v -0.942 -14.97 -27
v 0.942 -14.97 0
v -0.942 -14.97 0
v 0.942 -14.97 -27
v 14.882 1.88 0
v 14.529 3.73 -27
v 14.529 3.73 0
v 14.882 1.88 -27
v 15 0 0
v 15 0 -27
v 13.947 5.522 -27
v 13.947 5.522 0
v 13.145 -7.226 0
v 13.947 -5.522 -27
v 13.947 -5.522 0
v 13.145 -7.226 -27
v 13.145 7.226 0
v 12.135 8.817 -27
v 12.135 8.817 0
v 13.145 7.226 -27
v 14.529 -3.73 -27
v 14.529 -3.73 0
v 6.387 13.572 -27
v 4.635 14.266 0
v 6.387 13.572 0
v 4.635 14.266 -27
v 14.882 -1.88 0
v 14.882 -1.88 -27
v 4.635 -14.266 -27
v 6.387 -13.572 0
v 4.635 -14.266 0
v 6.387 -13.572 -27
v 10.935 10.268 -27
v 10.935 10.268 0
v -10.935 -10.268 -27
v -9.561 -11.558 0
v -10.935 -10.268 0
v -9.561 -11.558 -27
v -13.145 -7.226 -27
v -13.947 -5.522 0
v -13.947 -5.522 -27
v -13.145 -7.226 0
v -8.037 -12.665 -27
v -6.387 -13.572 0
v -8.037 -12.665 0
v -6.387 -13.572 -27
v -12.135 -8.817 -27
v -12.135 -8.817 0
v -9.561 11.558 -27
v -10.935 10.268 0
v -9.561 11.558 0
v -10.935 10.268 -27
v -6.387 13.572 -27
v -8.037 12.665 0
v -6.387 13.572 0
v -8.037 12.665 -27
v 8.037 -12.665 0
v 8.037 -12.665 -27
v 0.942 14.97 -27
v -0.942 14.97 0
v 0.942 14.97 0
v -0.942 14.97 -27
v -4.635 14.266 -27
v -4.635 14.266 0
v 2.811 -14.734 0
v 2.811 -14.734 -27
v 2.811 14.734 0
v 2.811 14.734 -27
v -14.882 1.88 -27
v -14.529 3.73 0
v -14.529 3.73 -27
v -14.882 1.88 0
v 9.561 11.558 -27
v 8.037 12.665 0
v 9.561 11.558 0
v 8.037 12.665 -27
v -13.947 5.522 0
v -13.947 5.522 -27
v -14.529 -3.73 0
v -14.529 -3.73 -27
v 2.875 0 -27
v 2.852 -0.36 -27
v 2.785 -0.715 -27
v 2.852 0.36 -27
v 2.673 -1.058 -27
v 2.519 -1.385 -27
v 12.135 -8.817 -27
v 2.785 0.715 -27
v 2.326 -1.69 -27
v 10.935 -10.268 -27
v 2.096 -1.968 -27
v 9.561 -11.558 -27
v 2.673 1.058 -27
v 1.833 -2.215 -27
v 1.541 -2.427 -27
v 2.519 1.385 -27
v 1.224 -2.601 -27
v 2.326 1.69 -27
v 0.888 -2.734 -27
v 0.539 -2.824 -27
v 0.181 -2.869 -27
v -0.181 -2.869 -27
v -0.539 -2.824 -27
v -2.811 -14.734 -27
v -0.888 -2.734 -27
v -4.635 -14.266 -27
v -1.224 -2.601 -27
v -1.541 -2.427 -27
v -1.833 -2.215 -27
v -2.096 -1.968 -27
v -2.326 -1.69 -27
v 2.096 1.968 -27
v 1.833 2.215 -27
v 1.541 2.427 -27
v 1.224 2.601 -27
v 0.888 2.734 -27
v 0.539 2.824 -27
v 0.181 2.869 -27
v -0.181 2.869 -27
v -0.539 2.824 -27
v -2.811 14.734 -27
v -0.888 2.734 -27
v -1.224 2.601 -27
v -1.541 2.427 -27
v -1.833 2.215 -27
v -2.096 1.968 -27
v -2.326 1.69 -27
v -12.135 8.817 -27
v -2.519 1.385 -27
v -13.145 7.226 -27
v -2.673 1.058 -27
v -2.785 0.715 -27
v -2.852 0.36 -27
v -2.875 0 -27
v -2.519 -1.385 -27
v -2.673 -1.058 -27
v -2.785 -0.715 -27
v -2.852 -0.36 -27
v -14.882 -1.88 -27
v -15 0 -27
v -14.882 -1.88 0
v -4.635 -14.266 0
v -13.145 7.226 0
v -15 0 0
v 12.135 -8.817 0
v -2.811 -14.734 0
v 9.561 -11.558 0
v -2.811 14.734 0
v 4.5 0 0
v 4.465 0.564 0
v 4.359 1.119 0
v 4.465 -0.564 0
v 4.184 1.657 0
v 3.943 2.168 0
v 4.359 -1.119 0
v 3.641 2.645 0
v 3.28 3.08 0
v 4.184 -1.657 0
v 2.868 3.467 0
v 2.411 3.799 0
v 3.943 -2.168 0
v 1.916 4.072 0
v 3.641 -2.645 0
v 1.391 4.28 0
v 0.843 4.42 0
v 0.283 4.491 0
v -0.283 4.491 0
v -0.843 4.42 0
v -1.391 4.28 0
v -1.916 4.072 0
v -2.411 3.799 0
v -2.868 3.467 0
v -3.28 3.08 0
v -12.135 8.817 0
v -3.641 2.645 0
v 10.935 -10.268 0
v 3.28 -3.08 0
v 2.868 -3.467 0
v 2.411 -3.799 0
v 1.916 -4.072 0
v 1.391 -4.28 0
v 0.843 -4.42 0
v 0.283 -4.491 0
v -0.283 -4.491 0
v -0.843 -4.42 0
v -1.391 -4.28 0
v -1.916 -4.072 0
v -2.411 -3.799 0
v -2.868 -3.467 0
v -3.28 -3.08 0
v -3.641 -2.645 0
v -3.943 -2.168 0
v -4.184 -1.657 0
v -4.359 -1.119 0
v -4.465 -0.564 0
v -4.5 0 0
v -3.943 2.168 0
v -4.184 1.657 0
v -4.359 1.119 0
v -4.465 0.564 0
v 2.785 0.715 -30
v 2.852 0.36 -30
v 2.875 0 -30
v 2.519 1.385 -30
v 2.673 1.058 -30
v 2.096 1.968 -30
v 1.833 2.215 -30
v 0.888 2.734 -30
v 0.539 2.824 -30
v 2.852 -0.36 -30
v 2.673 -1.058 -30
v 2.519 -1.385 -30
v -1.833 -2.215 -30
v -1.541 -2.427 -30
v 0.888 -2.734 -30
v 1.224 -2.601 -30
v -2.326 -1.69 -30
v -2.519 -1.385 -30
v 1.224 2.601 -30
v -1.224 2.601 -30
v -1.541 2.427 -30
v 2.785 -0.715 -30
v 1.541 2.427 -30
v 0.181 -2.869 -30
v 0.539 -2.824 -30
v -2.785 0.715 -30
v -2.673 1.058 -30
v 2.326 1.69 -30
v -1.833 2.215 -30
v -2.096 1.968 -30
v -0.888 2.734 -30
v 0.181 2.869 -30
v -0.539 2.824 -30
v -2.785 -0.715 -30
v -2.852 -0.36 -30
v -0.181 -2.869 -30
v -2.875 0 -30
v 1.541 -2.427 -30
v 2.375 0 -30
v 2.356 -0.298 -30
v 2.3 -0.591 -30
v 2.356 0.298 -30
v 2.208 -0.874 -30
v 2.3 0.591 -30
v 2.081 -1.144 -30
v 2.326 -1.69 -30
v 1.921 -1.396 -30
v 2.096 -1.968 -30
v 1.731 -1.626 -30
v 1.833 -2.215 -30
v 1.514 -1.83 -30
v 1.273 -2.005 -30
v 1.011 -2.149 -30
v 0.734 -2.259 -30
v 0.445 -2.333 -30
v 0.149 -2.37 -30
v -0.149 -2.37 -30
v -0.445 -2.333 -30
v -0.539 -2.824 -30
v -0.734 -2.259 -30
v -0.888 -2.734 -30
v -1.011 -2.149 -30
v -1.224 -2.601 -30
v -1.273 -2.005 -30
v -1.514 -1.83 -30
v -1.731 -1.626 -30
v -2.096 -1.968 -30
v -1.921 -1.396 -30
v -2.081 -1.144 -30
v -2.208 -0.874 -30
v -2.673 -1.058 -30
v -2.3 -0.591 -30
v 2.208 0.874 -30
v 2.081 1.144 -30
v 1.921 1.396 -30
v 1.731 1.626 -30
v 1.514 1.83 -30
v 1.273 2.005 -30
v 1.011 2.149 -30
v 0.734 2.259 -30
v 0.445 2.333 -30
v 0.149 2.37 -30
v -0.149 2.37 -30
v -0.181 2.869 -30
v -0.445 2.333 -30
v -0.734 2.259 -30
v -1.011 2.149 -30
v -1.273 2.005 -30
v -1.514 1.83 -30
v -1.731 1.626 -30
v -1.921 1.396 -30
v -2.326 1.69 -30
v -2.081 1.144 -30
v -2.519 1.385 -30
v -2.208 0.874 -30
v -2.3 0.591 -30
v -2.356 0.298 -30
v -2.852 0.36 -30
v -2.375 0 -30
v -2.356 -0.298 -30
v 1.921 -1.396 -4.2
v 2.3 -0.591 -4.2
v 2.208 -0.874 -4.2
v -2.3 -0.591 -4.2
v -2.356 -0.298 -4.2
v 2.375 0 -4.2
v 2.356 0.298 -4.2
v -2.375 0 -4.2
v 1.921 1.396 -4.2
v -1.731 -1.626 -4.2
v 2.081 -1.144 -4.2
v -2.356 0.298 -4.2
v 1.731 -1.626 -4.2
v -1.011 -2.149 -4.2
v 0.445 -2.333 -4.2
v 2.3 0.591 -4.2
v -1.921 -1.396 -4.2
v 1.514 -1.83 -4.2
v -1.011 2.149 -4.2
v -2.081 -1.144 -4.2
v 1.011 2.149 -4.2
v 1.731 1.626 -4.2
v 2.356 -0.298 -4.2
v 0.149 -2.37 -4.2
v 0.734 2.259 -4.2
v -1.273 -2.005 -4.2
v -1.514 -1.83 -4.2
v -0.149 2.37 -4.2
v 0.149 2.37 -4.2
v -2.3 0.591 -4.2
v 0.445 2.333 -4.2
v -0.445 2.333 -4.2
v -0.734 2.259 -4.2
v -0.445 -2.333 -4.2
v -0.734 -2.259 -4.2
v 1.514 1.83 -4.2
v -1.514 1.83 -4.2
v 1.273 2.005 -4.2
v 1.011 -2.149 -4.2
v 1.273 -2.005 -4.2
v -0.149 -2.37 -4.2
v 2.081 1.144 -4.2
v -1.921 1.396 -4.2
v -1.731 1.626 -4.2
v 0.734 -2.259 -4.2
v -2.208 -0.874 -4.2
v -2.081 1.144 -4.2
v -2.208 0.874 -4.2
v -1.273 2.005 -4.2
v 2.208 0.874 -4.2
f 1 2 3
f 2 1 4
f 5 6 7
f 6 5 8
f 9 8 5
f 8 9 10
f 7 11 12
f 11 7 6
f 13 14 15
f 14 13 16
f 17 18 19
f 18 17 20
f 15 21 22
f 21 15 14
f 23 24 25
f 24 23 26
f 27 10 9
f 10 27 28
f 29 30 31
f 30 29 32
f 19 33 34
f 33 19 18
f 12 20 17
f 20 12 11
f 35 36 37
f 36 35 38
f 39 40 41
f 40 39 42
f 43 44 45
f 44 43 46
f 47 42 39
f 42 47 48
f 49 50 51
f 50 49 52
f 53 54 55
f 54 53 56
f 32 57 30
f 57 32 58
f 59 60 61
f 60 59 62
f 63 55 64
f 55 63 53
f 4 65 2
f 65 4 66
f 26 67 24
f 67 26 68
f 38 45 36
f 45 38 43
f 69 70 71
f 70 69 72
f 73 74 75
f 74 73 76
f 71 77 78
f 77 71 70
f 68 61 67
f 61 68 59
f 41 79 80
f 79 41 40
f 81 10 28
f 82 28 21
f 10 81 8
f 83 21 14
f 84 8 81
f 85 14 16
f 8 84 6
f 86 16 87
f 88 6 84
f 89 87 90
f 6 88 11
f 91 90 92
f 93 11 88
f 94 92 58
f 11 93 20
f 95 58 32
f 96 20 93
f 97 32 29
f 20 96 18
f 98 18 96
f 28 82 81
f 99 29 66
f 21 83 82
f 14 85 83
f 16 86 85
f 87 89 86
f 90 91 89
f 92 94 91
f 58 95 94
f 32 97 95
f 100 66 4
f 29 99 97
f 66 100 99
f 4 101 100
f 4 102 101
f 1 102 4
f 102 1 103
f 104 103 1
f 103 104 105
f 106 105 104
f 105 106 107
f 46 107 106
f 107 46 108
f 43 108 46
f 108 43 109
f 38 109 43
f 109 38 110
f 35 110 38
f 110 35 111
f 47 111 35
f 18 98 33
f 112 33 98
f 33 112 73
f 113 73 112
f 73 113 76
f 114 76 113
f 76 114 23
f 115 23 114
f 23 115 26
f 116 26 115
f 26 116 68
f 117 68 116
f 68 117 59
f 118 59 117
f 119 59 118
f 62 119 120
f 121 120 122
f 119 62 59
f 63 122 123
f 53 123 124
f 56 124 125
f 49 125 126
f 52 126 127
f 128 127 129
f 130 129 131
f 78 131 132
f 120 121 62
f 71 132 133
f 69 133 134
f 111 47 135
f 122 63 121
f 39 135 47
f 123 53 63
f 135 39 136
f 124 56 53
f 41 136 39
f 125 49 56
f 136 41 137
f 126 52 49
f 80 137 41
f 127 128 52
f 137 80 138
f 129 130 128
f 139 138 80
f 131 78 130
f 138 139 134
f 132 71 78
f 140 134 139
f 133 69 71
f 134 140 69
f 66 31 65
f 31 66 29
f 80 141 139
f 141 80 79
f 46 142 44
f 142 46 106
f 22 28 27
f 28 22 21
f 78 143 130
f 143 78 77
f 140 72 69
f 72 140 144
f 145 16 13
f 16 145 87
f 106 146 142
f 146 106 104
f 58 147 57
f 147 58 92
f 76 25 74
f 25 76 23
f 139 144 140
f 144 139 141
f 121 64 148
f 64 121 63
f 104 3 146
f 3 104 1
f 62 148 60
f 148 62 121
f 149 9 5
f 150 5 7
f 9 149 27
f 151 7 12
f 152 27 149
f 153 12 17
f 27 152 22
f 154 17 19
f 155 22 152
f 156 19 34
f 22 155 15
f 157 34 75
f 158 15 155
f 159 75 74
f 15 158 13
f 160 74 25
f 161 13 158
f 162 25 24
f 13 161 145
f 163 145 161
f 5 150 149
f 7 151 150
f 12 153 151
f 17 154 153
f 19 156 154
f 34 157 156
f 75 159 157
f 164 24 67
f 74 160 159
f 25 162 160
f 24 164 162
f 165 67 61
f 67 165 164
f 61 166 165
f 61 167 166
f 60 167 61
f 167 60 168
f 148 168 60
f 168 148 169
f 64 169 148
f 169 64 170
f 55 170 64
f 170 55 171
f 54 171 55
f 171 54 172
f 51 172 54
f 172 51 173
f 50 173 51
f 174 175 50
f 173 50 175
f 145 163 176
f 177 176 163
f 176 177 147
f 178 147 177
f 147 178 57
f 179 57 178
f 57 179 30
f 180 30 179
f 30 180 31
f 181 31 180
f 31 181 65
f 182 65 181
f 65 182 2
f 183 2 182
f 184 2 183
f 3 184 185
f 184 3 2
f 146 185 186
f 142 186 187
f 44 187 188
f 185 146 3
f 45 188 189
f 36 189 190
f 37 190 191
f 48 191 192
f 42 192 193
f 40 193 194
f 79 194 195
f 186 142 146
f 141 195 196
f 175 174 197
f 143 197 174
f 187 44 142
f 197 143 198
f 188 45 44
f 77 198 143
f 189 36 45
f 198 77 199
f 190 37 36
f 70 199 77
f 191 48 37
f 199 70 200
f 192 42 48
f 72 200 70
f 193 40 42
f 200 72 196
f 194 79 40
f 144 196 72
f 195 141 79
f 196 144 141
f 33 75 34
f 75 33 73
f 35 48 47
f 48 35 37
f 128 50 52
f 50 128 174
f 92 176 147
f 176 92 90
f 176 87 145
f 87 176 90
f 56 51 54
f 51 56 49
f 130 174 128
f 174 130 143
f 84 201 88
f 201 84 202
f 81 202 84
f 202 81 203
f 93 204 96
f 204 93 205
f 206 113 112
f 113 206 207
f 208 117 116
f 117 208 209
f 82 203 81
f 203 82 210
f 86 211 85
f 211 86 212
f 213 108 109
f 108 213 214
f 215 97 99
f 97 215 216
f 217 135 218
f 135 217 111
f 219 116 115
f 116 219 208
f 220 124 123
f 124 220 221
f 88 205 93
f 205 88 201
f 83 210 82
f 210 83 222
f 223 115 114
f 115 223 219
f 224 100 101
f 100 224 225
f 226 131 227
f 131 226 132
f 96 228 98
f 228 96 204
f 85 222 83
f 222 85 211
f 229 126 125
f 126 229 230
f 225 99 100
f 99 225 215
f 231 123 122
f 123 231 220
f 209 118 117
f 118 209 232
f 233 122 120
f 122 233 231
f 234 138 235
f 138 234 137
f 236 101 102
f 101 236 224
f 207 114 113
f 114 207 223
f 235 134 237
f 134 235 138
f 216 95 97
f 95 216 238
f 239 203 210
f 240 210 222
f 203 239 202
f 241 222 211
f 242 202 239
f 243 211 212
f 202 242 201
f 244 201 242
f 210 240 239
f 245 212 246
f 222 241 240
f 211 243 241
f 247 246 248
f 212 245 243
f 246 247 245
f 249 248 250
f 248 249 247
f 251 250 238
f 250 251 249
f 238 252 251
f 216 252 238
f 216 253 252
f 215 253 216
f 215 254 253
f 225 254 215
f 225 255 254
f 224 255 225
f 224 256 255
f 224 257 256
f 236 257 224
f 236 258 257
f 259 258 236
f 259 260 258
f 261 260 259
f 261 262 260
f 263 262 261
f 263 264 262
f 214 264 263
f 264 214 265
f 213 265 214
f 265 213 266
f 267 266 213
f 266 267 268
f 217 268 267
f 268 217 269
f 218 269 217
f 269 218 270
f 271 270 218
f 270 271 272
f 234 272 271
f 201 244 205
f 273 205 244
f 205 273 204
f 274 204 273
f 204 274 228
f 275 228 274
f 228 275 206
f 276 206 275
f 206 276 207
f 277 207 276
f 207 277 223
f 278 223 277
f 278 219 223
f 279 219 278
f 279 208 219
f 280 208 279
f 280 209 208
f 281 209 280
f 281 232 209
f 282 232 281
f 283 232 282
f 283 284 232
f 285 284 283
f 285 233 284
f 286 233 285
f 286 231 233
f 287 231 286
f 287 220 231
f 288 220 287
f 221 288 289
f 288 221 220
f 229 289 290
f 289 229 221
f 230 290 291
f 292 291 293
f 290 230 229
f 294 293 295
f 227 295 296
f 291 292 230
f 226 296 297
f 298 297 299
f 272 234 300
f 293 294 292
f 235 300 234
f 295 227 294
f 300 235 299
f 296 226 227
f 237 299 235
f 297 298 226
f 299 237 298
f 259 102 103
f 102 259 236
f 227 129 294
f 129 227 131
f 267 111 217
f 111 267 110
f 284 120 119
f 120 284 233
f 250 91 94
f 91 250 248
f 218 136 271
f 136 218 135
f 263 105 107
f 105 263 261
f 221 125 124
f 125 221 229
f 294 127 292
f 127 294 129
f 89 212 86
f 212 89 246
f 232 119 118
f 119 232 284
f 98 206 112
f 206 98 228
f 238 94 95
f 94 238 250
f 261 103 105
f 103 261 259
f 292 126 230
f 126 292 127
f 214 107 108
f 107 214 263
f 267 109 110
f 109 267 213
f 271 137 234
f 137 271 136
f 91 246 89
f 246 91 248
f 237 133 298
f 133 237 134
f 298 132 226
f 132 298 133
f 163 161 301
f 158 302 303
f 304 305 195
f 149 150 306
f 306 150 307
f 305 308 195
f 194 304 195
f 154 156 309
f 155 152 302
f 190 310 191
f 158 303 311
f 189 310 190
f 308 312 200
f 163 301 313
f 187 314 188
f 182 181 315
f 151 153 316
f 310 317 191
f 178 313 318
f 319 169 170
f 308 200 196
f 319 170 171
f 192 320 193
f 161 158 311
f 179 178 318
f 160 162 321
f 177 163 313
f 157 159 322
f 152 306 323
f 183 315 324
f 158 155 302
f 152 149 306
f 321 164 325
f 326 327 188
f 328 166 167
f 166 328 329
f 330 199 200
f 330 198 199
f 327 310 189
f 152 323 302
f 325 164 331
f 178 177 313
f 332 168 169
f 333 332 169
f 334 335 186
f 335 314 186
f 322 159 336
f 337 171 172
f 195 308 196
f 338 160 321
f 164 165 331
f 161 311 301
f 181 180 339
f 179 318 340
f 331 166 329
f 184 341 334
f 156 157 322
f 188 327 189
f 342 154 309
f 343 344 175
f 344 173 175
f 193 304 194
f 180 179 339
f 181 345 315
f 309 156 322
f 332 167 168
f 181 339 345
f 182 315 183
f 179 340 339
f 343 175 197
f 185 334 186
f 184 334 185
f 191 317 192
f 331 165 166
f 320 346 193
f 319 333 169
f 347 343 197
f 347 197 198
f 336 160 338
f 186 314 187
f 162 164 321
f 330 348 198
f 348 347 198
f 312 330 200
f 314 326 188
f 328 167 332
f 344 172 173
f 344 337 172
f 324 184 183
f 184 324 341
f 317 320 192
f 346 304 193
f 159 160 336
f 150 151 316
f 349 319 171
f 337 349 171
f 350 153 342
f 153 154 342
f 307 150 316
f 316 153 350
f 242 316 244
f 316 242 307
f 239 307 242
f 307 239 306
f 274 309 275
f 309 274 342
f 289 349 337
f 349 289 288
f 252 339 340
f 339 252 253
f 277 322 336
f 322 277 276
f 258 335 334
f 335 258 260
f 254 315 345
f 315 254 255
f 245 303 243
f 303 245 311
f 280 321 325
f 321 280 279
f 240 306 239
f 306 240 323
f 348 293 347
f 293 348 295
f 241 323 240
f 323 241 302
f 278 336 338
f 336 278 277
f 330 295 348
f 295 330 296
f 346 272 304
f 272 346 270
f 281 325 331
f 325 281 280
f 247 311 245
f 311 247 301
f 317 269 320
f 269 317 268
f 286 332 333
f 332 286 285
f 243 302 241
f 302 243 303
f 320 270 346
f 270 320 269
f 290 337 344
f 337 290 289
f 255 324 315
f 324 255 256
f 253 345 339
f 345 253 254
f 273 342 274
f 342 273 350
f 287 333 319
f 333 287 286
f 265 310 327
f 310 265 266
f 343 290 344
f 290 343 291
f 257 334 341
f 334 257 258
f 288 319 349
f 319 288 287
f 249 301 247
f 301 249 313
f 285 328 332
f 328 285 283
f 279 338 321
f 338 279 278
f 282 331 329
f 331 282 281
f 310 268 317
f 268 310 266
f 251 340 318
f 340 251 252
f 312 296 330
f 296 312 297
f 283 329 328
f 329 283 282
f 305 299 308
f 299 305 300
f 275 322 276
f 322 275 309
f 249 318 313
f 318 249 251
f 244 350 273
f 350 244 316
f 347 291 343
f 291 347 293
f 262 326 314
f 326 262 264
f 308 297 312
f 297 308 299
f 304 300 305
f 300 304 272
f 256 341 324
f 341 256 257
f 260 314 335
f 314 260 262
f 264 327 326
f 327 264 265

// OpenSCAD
$fn = 50;


difference() {
	union() {
		translate(v = [0, 0, -27.0000000000]) {
			cylinder(h = 27, r = 15.0000000000);
		}
		#translate(v = [0, 0, -30.0000000000]) {
			cylinder(h = 30, r = 2.8750000000);
		}
	}
	union() {
		translate(v = [0, 0, 0]) {
			rotate(a = [0, 0, 0]) {
				difference() {
					union() {
						translate(v = [0, 0, -30.0000000000]) {
							cylinder(h = 30, r = 2.2500000000);
						}
						translate(v = [0, 0, -4.2000000000]) {
							cylinder(h = 4.2000000000, r1 = 2.3750000000, r2 = 4.5000000000);
						}
						translate(v = [0, 0, -30.0000000000]) {
							cylinder(h = 30, r = 2.3750000000);
						}
						translate(v = [0, 0, -30.0000000000]) {
							cylinder(h = 30, r = 2.2500000000);
						}
					}
					union();
				}
			}
		}
	}
}
